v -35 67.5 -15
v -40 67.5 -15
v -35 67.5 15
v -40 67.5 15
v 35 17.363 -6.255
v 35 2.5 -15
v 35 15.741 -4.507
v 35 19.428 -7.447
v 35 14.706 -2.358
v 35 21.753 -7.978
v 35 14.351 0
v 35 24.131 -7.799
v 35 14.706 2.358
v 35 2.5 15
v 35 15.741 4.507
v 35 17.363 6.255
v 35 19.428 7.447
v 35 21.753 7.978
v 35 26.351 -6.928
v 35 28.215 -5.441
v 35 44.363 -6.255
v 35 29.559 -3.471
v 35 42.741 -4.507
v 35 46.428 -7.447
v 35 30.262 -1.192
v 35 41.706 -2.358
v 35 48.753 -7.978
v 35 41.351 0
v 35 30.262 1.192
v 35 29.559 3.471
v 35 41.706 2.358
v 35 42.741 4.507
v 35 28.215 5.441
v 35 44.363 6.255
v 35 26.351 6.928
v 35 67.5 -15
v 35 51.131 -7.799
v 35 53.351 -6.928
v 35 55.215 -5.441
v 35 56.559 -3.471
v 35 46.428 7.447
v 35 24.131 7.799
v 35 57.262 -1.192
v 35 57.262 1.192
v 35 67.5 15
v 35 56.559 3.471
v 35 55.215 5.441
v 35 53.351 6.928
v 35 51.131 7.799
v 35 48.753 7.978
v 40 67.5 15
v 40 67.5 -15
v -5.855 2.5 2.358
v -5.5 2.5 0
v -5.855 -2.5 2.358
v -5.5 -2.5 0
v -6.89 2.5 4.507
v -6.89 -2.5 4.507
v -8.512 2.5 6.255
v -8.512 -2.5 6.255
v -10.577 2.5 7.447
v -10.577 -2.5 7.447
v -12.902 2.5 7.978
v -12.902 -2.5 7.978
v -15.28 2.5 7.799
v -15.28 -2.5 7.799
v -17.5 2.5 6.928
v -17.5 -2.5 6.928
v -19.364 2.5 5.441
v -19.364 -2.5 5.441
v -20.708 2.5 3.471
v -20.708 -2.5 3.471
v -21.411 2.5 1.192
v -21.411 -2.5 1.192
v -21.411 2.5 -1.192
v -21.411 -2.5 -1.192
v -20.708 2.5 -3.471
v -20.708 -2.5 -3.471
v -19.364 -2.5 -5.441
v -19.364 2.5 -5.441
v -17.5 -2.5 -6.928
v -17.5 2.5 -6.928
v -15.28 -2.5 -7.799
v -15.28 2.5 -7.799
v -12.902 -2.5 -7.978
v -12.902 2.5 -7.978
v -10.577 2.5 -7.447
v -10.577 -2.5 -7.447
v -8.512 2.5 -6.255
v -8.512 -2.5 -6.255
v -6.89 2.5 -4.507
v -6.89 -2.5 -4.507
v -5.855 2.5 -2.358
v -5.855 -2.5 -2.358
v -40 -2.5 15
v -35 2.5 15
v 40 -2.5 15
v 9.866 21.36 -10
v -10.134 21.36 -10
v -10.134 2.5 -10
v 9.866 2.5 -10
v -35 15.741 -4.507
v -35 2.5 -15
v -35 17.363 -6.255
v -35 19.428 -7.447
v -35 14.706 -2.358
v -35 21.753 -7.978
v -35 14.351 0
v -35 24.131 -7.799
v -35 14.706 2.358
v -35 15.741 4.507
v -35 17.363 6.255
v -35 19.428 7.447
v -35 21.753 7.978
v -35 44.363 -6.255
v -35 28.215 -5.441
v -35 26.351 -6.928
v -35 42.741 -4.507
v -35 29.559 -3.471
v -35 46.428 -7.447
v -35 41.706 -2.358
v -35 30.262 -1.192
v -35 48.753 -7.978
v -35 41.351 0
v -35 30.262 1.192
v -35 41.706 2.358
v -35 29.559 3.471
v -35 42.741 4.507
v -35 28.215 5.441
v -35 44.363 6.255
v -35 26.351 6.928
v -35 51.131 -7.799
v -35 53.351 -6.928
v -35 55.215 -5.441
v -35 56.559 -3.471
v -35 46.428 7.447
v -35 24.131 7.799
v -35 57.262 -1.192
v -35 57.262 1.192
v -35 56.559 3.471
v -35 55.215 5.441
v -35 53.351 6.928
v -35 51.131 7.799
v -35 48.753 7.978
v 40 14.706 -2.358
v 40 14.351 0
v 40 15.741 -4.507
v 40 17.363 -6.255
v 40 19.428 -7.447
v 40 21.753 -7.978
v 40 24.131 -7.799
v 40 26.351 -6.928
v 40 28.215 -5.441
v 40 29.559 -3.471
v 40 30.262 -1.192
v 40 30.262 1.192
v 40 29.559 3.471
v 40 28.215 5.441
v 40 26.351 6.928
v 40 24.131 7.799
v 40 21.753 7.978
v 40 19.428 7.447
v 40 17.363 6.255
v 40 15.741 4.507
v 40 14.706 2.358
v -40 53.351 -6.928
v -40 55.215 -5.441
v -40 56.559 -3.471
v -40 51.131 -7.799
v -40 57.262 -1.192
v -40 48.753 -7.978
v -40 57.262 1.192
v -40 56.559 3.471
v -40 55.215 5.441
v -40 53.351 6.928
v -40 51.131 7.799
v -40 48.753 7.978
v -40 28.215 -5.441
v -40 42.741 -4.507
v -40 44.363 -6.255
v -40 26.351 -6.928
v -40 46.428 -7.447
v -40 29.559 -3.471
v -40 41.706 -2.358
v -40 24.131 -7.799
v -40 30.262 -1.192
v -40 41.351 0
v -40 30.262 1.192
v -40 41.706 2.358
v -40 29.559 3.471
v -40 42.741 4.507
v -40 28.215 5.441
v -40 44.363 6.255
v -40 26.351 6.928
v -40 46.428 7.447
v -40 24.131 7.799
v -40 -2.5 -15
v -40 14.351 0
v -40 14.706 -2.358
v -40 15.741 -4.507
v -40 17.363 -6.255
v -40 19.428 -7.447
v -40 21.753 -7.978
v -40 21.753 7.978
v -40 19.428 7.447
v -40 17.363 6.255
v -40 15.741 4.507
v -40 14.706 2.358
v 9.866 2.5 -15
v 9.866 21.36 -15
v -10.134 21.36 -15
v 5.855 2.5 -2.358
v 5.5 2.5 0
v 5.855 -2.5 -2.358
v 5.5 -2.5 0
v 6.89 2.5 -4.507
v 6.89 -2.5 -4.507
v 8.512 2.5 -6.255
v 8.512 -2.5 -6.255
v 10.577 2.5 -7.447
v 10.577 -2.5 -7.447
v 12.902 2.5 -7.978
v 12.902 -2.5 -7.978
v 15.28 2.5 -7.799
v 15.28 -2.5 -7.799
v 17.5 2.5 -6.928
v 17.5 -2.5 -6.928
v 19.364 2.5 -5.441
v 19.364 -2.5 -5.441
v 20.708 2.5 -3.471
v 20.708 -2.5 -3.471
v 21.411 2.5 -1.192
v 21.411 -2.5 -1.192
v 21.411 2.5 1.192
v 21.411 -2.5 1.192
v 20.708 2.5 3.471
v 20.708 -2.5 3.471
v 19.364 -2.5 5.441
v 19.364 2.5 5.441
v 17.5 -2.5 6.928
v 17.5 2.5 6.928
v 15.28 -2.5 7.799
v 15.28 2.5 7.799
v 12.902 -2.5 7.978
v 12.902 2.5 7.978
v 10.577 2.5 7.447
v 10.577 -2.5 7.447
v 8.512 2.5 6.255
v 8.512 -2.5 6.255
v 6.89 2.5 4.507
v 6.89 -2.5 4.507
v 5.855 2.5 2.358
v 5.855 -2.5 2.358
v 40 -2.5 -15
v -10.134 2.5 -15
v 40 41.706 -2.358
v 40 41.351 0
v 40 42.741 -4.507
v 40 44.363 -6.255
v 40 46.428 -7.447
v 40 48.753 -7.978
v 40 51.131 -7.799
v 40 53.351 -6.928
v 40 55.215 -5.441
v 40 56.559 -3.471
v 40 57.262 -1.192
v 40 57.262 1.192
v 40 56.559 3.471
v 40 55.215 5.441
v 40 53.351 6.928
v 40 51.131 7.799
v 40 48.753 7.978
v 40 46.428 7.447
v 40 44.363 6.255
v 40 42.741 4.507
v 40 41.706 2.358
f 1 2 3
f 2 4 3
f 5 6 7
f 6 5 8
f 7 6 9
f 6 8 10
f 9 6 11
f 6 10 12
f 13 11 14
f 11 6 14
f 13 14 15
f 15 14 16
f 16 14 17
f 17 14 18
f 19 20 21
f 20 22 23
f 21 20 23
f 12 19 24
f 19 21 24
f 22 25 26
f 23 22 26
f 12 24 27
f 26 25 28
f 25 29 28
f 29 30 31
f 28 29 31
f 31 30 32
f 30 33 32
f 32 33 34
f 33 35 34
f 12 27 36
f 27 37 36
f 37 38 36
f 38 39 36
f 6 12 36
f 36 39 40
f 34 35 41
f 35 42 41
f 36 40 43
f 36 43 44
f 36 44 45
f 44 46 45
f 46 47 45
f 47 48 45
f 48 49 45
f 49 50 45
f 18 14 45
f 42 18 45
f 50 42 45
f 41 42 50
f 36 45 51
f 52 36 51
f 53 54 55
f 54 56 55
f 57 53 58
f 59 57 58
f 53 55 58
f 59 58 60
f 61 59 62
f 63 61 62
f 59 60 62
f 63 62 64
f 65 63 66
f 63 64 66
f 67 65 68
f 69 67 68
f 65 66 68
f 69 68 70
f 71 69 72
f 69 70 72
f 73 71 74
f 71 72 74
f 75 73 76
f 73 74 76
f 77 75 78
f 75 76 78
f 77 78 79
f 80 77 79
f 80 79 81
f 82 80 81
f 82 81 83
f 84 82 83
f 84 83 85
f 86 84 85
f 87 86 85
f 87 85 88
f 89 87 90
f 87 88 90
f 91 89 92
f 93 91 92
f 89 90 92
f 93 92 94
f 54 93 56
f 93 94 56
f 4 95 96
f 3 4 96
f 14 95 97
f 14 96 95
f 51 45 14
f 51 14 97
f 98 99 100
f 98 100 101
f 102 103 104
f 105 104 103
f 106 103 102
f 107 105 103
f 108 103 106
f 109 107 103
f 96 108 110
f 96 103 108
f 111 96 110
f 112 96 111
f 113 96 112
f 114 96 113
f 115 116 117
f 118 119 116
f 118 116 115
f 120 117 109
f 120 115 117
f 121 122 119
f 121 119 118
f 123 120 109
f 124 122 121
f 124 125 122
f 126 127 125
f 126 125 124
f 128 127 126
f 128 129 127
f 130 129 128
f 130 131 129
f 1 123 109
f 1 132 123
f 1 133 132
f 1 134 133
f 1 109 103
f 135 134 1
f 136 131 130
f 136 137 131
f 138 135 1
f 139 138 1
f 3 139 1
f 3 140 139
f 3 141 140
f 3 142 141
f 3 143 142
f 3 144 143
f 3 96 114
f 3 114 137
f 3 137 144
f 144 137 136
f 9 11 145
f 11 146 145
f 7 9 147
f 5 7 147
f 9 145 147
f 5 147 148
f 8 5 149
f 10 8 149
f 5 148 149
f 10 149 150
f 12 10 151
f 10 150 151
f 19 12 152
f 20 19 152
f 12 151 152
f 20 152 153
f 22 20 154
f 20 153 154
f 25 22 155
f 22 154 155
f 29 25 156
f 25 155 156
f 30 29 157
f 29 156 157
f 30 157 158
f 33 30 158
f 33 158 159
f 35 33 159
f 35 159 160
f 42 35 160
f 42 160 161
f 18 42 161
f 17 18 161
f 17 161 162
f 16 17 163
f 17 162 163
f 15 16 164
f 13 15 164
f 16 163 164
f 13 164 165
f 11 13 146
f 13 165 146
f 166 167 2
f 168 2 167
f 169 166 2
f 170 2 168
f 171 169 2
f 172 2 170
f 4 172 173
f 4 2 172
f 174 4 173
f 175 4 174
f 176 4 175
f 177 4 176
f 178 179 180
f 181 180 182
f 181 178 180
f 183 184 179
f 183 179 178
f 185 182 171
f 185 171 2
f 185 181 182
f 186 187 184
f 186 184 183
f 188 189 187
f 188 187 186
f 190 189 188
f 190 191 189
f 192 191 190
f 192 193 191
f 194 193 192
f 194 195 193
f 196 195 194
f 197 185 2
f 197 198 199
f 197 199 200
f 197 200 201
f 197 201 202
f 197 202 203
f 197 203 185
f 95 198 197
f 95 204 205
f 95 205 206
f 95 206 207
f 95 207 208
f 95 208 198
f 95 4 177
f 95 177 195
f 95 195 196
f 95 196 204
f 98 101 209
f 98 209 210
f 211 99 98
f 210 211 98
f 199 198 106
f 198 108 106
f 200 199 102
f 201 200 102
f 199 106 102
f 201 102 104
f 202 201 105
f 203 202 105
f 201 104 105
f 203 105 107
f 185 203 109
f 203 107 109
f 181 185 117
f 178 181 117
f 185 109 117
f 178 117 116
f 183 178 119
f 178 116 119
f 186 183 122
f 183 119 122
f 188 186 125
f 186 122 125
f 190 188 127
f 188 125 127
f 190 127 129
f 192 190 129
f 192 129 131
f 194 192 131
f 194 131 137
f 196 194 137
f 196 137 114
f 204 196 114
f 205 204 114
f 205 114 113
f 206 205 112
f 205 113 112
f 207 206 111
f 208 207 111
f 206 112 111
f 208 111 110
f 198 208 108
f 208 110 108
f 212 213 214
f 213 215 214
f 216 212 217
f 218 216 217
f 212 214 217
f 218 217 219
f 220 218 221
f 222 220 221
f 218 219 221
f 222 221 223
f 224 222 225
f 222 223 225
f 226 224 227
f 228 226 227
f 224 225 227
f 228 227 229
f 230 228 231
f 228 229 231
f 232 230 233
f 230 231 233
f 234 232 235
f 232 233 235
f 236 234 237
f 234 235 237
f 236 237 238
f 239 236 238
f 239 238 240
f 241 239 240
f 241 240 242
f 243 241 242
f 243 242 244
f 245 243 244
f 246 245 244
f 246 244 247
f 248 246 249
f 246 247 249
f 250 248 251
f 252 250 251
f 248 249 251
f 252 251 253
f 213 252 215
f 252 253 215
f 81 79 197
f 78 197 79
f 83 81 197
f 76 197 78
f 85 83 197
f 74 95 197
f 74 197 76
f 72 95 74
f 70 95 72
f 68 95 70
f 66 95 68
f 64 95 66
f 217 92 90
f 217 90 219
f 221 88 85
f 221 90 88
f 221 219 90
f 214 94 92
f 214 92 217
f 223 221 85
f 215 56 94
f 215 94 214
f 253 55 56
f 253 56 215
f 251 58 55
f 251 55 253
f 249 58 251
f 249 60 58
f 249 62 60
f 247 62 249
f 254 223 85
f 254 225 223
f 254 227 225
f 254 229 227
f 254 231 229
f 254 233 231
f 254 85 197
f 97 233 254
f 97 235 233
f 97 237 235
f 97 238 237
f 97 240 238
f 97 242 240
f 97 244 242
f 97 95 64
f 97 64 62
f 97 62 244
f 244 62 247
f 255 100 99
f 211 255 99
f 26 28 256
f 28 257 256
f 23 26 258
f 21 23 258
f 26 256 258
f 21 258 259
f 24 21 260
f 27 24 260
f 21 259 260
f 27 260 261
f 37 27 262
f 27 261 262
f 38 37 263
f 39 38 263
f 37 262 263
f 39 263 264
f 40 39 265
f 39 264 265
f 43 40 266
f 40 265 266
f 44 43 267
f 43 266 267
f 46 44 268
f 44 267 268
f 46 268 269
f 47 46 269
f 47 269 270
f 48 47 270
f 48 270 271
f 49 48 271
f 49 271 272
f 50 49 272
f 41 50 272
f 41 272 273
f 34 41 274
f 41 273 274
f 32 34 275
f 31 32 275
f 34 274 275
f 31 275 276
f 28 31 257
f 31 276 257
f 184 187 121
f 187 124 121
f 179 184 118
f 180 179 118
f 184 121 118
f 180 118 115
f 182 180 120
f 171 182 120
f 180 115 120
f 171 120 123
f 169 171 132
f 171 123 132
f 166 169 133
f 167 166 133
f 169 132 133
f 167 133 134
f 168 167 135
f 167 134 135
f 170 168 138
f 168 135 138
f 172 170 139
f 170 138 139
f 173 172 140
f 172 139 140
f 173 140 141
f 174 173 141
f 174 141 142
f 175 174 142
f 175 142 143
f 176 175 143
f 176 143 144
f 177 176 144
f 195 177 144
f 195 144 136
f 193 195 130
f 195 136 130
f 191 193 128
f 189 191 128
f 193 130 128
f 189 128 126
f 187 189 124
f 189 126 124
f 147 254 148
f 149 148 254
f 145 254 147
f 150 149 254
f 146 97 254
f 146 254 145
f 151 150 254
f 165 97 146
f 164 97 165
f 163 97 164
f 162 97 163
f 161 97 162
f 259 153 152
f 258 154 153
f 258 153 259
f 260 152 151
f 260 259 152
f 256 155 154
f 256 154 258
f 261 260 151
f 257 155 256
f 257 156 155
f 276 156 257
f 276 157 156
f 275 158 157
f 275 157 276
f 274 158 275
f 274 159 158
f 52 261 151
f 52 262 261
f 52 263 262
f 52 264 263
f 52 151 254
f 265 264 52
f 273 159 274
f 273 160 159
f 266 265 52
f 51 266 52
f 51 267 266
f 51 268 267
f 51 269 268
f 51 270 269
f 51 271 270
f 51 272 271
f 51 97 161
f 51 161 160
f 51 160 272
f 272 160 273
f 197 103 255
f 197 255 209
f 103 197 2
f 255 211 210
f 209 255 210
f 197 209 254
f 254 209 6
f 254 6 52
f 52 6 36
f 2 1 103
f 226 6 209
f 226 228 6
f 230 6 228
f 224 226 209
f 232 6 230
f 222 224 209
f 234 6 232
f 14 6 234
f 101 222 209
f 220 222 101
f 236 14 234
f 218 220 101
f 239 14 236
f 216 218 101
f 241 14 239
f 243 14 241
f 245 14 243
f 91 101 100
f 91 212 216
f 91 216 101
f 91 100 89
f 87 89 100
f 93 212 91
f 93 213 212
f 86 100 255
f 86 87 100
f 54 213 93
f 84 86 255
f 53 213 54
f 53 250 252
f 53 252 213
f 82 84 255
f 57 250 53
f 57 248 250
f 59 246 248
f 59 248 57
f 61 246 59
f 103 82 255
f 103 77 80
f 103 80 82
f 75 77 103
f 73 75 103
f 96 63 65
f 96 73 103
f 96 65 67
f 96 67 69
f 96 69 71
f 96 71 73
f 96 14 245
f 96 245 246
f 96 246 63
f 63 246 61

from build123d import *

# Parameters (mm, degrees)
F0_W     = 5
F0_H     = 65
F1_DEPTH = 15
F2_R     = 8
F3_DEPTH = 12.5
F6_DEPTH = 50
F9_START = -10
F8_W     = 20
F8_H     = 20
F9_DEPTH = 5


with BuildPart() as f1:
    # F0 (on Top) → F1 (new body, symmetric)
    with BuildSketch(Plane.XY):
        Polygon((40, -2.5), (40, 2.5), (35, 2.5), (-35, 2.5), (-40, 2.5), (-40, -2.5), align=None)
        with Locations((37.5, 35)):
            Rectangle(F0_W, F0_H)
        with Locations((-37.5, 35)):
            Rectangle(F0_W, F0_H)
    extrude(amount=F1_DEPTH, both=True)


with BuildPart() as f3:
    # F2 (on Front) → F3 (new body, symmetric)
    with BuildSketch(Plane.XZ):
        with Locations((-13.5, 0)):
            Circle(F2_R)
    extrude(amount=F3_DEPTH, both=True)


with BuildPart() as f3b:
    # F2 (on Front) → F3, piece 2 (new body, symmetric)
    with BuildSketch(Plane.XZ):
        with BuildLine():
            ThreePointArc((21.5, 0), (13.5, 8), (5.5, 0))
            ThreePointArc((5.5, 0), (13.5, -8), (21.5, 0))
        make_face()
    extrude(amount=F3_DEPTH, both=True)


with BuildPart() as f1_1:
    add(f1.part)

    # F4: cut F3, F3b
    add(f3.part, mode=Mode.SUBTRACT)
    add(f3b.part, mode=Mode.SUBTRACT)


with BuildPart() as f6:
    # F5 (on Right) → F6 (new body, symmetric)
    with BuildSketch(Plane.YZ):
        with BuildLine():
            Line((22.3510495666, 0), (30.3510495666, 0))
            ThreePointArc((30.3510495666, 0), (22.3510495666, 8), (14.3510495666, 0))
            Line((14.3510495666, 0), (22.3510495666, 0))
        make_face()
        with BuildLine():
            ThreePointArc((14.3510495666, 0), (22.3510495666, -8), (30.3510495666, 0))
            Line((30.3510495666, 0), (22.3510495666, 0))
            Line((22.3510495666, 0), (14.3510495666, 0))
        make_face()
    extrude(amount=F6_DEPTH, both=True)


with BuildPart() as f6b:
    # F5 (on Right) → F6, piece 2 (new body, symmetric)
    with BuildSketch(Plane.YZ):
        with BuildLine():
            ThreePointArc((57.3510495666, 0), (49.3510495666, 8), (41.3510495666, 0))
            ThreePointArc((41.3510495666, 0), (49.3510495666, -8), (57.3510495666, 0))
        make_face()
    extrude(amount=F6_DEPTH, both=True)


with BuildPart() as f1_2:
    add(f1_1.part)

    # F7: cut F6, F6b
    add(f6.part, mode=Mode.SUBTRACT)
    add(f6b.part, mode=Mode.SUBTRACT)

    # F8 (on Top) → F9 (join)
    with BuildSketch(Plane.XY.offset(F9_START)):
        with Locations((-0.1337498054, 11.3596525043)):
            Rectangle(F8_W, F8_H)
    extrude(amount=-F9_DEPTH)


solid = f1_2.part
